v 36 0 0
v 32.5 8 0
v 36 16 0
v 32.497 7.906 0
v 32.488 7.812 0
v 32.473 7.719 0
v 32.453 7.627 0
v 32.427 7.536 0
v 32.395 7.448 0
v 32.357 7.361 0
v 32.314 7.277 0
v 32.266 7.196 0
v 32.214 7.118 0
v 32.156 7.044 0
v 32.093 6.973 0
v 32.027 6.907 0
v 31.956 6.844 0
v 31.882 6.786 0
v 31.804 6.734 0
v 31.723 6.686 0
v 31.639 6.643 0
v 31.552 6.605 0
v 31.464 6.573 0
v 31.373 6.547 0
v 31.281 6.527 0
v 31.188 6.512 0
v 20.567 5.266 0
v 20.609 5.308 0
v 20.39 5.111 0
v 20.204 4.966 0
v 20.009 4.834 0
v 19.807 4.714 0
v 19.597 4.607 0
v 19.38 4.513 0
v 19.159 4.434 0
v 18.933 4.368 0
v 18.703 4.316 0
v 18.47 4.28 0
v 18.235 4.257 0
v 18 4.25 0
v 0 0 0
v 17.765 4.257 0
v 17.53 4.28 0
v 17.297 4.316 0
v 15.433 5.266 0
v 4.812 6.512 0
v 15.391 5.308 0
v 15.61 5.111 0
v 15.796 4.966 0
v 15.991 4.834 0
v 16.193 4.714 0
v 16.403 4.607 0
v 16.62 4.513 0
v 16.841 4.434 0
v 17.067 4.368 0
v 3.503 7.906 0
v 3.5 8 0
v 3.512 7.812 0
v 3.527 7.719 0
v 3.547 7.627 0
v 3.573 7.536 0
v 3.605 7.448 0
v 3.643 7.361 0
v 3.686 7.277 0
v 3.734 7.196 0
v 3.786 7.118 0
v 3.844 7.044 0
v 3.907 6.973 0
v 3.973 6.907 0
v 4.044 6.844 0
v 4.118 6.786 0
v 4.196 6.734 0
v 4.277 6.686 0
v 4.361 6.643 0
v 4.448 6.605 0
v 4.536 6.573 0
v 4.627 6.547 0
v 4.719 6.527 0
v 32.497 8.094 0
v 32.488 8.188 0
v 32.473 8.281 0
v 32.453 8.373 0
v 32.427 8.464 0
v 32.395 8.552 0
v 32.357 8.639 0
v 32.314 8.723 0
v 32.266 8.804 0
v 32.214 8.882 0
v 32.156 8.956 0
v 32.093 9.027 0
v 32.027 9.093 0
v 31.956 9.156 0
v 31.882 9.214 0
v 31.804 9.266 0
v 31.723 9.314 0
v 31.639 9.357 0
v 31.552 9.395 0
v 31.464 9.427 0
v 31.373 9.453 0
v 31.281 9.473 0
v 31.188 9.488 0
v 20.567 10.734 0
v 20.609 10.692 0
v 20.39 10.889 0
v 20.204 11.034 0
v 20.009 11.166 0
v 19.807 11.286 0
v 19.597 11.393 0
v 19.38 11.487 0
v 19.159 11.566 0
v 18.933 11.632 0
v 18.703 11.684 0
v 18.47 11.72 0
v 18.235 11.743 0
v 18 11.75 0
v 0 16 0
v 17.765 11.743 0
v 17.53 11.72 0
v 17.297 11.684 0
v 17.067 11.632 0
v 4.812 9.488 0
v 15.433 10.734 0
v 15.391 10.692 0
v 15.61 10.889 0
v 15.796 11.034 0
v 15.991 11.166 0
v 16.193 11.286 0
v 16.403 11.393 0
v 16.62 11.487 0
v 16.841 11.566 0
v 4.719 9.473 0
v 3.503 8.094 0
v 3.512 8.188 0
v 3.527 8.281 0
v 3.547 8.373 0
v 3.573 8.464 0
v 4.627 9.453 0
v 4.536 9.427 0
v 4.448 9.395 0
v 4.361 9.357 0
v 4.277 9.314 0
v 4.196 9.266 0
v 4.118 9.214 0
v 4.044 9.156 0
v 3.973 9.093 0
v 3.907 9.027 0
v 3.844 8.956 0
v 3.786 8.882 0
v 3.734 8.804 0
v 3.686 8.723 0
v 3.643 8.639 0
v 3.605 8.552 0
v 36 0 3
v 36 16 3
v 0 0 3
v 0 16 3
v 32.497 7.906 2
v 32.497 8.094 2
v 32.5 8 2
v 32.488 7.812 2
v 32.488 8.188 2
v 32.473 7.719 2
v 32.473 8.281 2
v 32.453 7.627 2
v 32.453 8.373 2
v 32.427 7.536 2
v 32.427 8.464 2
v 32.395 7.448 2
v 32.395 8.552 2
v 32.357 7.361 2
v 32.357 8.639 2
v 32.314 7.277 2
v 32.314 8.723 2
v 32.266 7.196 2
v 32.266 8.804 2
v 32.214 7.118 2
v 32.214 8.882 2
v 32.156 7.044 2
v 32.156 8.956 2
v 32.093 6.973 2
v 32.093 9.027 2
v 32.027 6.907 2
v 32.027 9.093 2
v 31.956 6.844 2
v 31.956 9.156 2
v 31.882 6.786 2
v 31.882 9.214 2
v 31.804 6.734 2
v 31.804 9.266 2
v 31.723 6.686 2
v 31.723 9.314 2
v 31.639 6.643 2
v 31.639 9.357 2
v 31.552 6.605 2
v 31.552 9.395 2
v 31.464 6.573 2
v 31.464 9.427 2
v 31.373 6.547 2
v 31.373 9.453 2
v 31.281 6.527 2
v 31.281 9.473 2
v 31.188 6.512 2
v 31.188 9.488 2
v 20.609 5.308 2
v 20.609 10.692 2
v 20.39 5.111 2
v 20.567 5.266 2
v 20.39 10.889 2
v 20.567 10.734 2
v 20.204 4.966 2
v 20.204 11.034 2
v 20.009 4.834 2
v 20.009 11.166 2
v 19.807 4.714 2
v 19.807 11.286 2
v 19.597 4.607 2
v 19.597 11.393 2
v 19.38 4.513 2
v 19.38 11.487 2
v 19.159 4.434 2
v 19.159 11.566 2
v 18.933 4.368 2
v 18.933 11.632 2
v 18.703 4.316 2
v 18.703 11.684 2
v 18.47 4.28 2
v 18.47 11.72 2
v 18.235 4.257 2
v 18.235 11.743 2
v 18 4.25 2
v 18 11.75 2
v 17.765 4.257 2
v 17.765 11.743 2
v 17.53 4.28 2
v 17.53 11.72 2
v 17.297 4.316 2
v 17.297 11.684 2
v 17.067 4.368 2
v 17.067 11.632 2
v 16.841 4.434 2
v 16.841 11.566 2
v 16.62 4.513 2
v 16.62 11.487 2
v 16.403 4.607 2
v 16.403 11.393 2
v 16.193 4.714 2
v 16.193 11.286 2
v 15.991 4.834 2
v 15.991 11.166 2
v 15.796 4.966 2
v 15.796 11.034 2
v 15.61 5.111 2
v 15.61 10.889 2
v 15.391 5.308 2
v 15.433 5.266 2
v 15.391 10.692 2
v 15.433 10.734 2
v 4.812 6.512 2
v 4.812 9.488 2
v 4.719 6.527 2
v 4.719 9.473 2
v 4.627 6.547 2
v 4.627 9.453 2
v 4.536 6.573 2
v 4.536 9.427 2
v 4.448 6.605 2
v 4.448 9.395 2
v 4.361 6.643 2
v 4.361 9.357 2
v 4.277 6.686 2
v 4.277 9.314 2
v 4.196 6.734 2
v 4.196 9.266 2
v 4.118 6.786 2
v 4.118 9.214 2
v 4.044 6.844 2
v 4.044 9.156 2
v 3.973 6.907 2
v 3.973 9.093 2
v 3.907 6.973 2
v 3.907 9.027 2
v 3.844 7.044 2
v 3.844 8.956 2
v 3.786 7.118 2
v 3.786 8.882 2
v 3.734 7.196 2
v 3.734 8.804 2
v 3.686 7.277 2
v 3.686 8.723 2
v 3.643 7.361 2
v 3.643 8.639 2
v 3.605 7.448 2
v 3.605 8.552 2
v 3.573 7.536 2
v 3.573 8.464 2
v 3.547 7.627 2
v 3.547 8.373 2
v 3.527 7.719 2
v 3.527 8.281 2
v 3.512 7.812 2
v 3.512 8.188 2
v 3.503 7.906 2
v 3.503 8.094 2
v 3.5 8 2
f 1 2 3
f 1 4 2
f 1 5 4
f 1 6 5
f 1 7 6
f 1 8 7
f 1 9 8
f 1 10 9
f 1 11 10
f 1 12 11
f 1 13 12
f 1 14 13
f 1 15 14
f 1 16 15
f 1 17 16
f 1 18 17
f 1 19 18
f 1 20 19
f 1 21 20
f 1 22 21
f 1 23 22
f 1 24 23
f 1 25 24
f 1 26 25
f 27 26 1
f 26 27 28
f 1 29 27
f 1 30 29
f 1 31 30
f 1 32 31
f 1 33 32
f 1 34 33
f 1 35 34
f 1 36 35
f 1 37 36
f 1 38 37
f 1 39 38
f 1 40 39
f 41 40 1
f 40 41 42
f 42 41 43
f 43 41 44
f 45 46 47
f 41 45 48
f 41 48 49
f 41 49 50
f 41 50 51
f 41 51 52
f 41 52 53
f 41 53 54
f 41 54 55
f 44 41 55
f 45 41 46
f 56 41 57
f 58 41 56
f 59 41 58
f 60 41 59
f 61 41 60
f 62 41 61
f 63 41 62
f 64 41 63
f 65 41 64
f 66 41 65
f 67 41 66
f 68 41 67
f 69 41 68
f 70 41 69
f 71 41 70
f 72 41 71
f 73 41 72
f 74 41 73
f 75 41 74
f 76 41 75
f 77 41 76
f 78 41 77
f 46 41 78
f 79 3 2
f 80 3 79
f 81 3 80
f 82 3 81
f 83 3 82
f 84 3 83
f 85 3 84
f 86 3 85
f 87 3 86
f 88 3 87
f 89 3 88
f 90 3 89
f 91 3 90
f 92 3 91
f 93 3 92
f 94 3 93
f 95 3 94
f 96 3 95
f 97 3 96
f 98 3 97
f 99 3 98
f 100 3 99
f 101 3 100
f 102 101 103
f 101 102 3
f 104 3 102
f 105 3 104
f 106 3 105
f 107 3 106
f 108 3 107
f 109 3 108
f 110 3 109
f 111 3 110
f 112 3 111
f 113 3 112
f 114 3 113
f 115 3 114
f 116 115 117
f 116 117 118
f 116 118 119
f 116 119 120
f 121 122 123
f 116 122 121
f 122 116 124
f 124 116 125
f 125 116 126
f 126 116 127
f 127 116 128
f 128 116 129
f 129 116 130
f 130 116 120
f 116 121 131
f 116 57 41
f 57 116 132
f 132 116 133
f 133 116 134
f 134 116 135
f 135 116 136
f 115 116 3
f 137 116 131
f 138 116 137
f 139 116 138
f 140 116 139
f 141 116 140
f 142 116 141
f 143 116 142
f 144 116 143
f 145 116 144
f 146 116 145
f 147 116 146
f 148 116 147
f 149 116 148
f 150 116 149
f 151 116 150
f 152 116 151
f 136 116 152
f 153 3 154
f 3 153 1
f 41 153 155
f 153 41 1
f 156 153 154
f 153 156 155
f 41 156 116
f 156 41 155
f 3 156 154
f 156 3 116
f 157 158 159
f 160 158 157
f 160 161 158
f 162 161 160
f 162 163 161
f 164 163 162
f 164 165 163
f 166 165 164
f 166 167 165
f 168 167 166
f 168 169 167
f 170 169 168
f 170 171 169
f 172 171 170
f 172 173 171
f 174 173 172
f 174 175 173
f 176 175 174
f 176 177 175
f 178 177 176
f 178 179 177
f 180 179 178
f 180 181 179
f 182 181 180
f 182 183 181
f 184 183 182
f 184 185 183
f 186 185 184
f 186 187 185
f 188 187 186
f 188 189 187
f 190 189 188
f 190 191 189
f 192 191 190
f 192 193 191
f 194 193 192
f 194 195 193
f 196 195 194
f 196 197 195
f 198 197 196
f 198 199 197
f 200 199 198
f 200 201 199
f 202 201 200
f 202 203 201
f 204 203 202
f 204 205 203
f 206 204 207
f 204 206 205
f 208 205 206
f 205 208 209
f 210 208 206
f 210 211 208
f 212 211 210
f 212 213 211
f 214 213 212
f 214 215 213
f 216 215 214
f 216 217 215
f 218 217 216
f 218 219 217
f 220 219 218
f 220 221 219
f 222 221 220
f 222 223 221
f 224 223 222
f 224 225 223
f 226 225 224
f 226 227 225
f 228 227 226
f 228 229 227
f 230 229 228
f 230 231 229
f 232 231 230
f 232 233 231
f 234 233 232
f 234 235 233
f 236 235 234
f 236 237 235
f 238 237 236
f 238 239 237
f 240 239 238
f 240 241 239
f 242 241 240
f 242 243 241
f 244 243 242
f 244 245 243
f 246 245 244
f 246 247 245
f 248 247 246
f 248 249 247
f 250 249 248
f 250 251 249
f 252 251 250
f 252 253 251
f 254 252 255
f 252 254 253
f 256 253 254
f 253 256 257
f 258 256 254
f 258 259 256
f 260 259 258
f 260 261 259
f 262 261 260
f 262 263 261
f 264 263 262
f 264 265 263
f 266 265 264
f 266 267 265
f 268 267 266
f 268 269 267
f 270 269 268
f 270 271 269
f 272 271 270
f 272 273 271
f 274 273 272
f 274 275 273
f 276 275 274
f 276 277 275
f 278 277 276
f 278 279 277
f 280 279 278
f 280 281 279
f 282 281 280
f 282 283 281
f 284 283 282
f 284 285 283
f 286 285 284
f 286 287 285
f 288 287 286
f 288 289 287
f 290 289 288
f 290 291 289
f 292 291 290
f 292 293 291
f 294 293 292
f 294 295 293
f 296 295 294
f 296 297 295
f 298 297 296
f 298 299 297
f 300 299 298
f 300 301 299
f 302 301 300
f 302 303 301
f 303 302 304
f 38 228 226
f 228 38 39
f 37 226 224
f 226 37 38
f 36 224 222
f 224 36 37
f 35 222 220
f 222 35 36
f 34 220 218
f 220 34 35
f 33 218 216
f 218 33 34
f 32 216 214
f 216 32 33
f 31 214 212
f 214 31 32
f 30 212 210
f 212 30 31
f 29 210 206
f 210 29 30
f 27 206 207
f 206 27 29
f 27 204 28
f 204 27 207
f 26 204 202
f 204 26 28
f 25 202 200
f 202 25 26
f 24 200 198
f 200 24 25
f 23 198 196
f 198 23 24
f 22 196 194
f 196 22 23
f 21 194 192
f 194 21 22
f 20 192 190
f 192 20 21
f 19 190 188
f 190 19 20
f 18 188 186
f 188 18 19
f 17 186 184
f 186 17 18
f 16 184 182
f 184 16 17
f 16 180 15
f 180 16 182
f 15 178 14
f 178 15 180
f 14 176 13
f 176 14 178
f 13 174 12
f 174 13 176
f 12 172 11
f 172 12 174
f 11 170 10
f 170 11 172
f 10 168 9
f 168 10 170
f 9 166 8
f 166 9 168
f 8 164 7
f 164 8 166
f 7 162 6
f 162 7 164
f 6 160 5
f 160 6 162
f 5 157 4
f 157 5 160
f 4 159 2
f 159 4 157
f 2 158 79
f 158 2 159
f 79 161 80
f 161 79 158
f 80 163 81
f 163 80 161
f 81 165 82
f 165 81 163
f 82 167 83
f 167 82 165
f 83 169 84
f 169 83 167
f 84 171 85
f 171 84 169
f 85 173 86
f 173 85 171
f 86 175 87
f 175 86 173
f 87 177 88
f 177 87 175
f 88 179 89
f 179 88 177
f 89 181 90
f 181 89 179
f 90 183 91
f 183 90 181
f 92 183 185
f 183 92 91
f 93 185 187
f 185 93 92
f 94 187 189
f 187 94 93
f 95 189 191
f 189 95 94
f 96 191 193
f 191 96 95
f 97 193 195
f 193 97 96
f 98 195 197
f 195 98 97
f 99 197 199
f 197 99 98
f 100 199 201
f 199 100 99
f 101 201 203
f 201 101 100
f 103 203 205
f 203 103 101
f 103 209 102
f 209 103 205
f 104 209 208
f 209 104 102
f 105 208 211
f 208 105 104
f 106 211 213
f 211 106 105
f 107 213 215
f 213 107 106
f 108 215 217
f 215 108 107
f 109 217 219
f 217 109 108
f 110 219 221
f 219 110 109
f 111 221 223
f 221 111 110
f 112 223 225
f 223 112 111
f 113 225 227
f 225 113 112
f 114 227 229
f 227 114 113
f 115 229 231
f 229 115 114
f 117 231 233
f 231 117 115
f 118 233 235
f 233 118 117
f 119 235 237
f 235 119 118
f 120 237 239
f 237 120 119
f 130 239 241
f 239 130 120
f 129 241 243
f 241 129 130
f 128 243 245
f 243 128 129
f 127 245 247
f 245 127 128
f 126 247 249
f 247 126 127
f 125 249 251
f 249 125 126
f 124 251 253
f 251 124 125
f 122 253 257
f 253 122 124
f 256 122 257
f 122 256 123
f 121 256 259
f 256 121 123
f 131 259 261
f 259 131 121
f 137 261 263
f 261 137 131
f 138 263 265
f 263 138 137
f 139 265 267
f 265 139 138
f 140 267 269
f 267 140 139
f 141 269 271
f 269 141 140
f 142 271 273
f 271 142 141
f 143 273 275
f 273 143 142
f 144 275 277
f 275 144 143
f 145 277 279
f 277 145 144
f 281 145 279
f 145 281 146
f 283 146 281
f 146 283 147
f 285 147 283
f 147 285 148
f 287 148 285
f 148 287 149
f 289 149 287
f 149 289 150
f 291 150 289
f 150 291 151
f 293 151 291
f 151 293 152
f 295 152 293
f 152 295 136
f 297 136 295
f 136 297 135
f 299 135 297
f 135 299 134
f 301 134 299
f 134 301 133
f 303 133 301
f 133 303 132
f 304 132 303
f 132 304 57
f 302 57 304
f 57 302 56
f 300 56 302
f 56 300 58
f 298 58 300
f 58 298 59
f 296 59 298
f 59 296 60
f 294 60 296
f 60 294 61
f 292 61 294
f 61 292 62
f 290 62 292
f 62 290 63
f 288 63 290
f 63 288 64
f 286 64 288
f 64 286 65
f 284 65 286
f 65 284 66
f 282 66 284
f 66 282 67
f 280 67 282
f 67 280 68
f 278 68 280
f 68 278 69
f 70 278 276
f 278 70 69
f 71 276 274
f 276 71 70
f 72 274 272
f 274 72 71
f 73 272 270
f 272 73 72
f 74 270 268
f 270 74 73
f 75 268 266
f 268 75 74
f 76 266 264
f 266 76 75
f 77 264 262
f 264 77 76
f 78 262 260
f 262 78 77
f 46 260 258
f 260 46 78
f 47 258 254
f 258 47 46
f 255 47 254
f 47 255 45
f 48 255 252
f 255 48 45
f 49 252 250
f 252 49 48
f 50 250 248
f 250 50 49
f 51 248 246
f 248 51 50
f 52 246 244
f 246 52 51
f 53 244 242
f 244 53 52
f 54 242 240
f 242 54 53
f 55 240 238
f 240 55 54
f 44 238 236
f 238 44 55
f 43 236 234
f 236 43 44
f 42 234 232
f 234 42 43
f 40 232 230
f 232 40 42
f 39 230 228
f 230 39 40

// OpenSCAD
$fn=100;


difference() {

  linear_extrude( height=3)
  color ( "blue") polygon( [ [0,0],[36,0],[36,16],[0,16] ] , [   [0,1,2,3] ]);
  linear_extrude( height=2)
  union() {
	  translate ([18,8,3]) circle(7.5/2);

 	
	  hull() 
	  {
 
 	   color( "Red") 
 	   translate([19.5,8,3]) circle ( 5.6/2);
 	   translate([31,8,3]) circle (1.5);
	  }

	  hull() 
	  { 	
 
 	   color("Red")
 	   translate([16.5,8,3]) circle ( 5.6/2);
 	   translate([5,8,3]) circle (1.5);
	  }

 }

}
